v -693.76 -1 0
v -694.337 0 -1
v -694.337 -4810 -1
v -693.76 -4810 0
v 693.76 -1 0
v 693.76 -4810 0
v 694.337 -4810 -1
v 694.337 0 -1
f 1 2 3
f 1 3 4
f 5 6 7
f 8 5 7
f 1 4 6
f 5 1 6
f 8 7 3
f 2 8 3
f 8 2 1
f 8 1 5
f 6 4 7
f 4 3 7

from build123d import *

# Parameters (mm, degrees)
BOSS_EXTRUDE1_DEPTH = 4810
CHAMFER1_SIZE       = 1


with BuildPart() as part:
    # Sketch3 → Boss-Extrude1 (new body)
    with BuildSketch(Plane(origin=(0, 0, 0), x_dir=(1, 0, 0), z_dir=(0, 1, 0))):
        Polygon((-693.76, 0), (693.76, 0), (694.337350269, 1), (-694.337350269, 1), align=None)
    extrude(amount=-BOSS_EXTRUDE1_DEPTH)

    # Chamfer1
    chamfer1_edges = [part.edges().sort_by_distance(p)[0] for p in [
        (0, 0, 0),
    ]]
    chamfer(chamfer1_edges, length=CHAMFER1_SIZE - 0.0001)  # a hair under: the kernel refuses the full size


solid = part.part
